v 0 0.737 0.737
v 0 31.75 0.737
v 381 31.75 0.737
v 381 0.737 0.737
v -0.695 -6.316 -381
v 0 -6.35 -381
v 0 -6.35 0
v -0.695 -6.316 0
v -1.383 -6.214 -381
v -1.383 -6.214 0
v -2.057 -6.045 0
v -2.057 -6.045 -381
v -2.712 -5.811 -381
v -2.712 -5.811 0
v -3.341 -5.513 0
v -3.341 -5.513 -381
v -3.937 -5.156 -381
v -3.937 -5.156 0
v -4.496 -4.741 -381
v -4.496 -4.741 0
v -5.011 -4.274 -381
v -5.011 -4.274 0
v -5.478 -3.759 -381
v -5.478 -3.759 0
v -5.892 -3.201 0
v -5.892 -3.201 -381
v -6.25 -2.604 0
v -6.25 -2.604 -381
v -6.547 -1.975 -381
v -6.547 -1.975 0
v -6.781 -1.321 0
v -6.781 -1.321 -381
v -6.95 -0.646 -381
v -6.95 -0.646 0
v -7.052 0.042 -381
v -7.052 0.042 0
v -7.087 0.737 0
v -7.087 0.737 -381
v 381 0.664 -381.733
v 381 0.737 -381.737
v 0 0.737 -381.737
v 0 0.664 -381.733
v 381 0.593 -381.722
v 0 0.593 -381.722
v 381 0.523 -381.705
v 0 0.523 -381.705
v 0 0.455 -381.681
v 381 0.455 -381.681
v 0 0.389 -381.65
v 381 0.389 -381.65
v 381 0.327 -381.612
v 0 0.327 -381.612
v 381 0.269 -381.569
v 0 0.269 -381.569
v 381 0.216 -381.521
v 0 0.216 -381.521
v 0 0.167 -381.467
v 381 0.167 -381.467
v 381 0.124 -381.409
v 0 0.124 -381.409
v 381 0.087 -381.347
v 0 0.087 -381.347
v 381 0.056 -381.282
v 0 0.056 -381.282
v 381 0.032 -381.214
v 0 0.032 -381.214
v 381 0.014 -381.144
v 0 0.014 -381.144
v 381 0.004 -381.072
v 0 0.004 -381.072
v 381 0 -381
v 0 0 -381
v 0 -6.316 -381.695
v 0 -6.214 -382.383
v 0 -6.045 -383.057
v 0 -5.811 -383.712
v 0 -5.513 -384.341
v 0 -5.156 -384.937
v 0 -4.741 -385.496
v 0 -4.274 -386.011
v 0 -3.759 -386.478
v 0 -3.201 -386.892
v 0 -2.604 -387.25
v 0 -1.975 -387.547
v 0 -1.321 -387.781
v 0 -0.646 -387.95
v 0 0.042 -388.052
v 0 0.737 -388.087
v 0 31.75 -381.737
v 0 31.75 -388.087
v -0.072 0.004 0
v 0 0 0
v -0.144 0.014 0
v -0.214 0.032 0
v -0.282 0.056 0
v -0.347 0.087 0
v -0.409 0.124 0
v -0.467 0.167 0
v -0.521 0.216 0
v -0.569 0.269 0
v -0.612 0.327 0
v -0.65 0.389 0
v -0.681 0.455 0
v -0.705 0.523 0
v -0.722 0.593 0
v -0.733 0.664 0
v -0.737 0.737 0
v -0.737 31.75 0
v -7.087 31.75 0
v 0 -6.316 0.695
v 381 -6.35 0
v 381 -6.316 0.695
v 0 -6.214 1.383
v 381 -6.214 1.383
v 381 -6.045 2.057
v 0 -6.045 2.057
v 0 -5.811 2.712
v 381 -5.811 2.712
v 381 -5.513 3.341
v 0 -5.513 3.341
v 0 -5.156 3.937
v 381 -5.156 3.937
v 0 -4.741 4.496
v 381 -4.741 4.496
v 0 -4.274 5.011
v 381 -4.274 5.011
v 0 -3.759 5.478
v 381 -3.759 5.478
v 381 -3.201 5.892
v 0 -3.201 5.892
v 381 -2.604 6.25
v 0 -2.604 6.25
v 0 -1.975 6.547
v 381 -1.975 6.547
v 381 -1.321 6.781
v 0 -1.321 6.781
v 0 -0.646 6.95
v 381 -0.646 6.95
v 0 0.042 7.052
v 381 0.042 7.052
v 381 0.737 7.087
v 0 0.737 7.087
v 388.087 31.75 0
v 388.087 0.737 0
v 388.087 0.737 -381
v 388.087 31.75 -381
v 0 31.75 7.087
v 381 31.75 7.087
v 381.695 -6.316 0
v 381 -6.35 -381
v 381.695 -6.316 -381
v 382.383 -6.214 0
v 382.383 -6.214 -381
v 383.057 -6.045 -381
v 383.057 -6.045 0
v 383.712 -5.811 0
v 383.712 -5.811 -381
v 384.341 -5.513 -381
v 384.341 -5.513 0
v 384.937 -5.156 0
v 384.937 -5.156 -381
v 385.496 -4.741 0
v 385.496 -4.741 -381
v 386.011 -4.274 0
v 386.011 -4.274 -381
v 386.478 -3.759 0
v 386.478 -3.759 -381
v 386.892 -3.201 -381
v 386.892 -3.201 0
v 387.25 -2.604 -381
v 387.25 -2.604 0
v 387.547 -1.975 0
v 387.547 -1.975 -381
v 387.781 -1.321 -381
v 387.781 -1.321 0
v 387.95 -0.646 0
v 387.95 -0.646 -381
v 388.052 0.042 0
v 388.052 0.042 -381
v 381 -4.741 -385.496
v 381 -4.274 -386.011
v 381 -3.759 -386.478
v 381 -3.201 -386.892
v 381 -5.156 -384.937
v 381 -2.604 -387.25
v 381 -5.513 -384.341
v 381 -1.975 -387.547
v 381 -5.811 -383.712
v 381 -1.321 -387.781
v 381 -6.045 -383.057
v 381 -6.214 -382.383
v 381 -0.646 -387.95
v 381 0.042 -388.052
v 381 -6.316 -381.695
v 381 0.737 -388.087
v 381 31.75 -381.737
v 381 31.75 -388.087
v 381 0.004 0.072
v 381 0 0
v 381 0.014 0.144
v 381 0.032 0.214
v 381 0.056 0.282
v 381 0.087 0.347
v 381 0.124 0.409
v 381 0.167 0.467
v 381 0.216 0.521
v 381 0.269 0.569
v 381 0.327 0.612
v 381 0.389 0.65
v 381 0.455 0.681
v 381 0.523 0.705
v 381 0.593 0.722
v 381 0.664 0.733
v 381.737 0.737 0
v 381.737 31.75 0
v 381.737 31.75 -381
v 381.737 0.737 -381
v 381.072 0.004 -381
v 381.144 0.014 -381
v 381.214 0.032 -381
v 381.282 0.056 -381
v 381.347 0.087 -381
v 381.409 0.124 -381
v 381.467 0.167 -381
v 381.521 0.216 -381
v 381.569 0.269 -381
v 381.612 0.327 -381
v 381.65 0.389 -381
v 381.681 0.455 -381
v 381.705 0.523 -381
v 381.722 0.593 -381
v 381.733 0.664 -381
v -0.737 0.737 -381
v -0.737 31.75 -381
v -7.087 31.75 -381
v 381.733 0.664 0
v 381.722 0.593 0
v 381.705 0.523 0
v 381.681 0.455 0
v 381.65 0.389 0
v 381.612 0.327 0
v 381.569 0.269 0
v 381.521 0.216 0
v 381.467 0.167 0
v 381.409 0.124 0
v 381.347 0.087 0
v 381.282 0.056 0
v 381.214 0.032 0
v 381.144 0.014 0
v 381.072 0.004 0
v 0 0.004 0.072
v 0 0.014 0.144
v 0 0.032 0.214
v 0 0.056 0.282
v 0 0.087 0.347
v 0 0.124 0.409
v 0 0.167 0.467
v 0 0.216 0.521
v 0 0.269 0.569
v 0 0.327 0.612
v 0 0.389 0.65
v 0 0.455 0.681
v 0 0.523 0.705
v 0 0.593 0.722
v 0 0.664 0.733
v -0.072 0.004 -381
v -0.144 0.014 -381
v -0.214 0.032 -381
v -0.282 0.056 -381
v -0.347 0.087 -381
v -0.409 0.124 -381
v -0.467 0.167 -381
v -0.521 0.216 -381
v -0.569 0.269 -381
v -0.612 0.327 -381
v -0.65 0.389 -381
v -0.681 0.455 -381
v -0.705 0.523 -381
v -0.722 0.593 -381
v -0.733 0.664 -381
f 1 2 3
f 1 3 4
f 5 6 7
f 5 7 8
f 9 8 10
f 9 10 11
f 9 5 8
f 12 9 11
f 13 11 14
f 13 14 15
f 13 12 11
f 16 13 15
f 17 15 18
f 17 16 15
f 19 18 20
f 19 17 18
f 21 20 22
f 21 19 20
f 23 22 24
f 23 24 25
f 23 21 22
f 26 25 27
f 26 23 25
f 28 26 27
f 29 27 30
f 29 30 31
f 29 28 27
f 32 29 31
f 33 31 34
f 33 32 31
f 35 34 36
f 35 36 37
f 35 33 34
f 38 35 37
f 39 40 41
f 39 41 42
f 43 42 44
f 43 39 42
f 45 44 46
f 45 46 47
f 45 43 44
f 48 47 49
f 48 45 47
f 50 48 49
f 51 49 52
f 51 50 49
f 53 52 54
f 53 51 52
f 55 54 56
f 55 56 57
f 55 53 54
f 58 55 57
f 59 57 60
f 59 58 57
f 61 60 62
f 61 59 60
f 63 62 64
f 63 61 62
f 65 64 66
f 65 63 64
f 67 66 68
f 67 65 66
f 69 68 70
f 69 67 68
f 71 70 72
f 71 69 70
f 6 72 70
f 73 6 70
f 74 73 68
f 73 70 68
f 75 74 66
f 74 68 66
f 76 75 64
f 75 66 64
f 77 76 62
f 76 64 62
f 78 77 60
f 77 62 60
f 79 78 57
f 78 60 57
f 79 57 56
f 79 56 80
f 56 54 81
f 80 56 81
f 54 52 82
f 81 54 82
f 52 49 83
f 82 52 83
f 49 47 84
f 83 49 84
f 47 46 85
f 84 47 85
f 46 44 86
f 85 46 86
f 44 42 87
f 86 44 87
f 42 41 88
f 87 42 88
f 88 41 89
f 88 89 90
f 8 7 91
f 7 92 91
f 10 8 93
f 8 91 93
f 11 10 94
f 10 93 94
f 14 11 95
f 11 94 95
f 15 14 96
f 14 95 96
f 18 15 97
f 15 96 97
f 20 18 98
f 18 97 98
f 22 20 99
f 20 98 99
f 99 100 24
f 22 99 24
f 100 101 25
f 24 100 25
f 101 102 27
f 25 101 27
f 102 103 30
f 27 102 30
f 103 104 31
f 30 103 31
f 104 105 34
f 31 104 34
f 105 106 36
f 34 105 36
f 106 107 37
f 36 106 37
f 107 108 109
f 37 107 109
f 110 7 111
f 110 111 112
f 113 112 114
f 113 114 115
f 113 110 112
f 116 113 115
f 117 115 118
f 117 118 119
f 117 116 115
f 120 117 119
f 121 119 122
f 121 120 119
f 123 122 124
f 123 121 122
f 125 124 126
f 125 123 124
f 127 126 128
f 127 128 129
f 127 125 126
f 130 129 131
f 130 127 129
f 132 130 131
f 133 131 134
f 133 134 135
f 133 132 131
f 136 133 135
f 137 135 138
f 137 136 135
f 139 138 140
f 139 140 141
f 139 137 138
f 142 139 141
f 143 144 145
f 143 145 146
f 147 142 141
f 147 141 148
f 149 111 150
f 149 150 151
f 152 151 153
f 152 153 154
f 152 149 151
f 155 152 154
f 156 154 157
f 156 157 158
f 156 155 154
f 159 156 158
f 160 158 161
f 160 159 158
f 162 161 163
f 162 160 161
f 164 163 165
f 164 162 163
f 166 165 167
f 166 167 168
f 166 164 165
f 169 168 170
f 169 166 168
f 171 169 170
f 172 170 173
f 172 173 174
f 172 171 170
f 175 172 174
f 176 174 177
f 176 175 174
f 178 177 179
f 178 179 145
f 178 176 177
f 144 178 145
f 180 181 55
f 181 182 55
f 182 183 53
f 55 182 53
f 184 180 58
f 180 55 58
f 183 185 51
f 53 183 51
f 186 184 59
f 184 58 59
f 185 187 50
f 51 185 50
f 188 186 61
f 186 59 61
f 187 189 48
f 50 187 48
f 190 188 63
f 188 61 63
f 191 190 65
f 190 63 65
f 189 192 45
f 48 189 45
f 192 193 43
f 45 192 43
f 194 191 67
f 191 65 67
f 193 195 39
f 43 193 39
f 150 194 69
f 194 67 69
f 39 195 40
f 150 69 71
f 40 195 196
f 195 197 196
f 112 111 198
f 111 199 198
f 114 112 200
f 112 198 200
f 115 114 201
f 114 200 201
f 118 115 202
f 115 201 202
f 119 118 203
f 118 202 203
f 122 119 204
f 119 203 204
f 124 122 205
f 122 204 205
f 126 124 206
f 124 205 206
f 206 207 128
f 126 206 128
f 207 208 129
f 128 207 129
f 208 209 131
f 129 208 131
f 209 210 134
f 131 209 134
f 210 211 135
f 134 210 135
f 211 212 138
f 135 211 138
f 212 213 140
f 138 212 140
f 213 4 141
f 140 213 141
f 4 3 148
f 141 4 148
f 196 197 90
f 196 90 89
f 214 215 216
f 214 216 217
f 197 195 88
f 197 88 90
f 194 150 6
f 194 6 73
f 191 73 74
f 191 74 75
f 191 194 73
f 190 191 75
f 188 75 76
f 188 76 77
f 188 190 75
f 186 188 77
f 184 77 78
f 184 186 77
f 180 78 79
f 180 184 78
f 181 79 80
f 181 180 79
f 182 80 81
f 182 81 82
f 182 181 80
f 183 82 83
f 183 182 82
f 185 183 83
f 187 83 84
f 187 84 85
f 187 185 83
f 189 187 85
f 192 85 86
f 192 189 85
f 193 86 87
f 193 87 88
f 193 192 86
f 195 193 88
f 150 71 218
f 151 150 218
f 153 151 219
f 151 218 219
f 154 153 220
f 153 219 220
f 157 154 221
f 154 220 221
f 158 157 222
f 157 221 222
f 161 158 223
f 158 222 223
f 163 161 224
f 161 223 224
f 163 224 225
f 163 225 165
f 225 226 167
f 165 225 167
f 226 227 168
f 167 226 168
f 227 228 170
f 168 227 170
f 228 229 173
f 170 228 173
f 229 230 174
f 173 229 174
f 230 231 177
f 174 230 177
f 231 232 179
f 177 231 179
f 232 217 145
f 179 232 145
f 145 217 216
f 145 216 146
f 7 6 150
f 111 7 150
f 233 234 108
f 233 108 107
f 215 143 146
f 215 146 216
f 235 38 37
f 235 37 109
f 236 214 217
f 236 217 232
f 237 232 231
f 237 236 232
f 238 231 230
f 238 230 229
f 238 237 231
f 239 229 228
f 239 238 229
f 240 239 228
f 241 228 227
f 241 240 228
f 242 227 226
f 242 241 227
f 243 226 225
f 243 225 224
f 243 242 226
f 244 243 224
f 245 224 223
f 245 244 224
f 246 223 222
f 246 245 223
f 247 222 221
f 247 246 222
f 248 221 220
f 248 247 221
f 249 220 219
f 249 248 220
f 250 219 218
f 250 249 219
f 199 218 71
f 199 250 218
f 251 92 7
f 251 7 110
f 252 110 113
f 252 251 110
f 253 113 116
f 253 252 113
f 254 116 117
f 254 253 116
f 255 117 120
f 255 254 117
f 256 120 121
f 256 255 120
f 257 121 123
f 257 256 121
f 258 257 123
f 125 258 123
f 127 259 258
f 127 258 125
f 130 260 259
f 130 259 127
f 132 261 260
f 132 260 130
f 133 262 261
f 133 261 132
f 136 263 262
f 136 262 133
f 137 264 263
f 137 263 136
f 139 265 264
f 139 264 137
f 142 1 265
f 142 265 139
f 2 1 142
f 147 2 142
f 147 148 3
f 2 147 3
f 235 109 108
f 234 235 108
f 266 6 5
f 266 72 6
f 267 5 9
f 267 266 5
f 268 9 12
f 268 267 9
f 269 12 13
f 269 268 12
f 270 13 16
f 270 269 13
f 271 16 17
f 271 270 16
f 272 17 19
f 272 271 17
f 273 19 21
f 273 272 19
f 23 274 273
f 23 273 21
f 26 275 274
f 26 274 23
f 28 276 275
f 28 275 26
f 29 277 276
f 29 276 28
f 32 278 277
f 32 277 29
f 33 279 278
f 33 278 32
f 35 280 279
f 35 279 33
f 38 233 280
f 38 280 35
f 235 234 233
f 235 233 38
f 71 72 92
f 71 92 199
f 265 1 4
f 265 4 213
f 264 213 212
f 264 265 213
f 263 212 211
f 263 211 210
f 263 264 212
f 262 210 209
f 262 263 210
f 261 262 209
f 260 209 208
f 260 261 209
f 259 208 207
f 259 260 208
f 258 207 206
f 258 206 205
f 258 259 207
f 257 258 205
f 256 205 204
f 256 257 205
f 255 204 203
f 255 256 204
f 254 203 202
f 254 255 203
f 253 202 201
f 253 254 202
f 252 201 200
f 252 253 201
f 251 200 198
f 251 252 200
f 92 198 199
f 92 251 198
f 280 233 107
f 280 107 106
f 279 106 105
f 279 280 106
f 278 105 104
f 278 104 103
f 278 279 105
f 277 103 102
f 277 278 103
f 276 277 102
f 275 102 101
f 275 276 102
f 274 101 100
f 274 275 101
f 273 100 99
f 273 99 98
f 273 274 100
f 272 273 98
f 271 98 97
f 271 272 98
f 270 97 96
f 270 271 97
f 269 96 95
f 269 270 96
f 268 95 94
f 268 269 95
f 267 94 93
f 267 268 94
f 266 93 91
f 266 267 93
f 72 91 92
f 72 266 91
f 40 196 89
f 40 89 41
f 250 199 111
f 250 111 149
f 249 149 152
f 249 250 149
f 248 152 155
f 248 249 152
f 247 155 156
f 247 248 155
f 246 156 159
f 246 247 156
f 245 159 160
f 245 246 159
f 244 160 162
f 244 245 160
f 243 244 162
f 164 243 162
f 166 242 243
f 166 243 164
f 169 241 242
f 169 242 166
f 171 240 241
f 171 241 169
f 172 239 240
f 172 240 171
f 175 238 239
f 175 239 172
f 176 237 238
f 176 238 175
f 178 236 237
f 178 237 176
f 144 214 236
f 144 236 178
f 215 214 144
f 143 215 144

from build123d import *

# Parameters (mm, degrees)
SKETCH1_W          = 381
SKETCH1_H          = 381
BASE_FLANGE1_DEPTH = 6.35
EDGE_FLANGE3_DEPTH = 381
EDGE_FLANGE4_DEPTH = 381
EDGE_FLANGE5_DEPTH = 381
EDGE_FLANGE6_DEPTH = 381


# Sheet-metal steps are written as plain solids
with BuildPart() as part:
    # Sketch1 → Base-Flange1 (new body)
    with BuildSketch(Plane(origin=(0, 0, 0), x_dir=(1, 0, 0), z_dir=(0, 1, 0))):
        with Locations((190.5, 190.5)):
            Rectangle(SKETCH1_W, SKETCH1_H)
    extrude(amount=-BASE_FLANGE1_DEPTH)

    # Edge-Flange3 section (across the edge) → Edge-Flange3 (add)
    with BuildSketch(Plane(origin=(-0.7366, 0, -381), x_dir=(1, 0, 0), z_dir=(0, 0, 1))):
        with BuildLine():
            Line((-6.35, 0.7366), (-6.35, 31.75))
            Line((-6.35, 31.75), (0, 31.75))
            Line((0, 31.75), (0, 0.7366))
            ThreePointArc((0, 0.7366), (0.215745145, 0.215745145), (0.7366, 0))
            Line((0.7366, 0), (0.7366, -6.35))
            ThreePointArc((0.7366, -6.35), (-4.274382916, -4.274382916), (-6.35, 0.7366))
        make_face()
    extrude(amount=EDGE_FLANGE3_DEPTH)

    # Edge-Flange4 section (across the edge) → Edge-Flange4 (add)
    with BuildSketch(Plane(origin=(381, 0, -381.7366), x_dir=(0, 0, 1), z_dir=(-1, 0, 0))):
        with BuildLine():
            Line((-6.35, 0.7366), (-6.35, 31.75))
            Line((-6.35, 31.75), (0, 31.75))
            Line((0, 31.75), (0, 0.7366))
            ThreePointArc((0, 0.7366), (0.215745145, 0.215745145), (0.7366, 0))
            Line((0.7366, 0), (0.7366, -6.35))
            ThreePointArc((0.7366, -6.35), (-4.274382916, -4.274382916), (-6.35, 0.7366))
        make_face()
    extrude(amount=EDGE_FLANGE4_DEPTH)

    # Edge-Flange5 section (across the edge) → Edge-Flange5 (add)
    with BuildSketch(Plane(origin=(0, 0, 0.7366), x_dir=(0, 0, -1), z_dir=(1, 0, 0))):
        with BuildLine():
            Line((-6.35, 0.7366), (-6.35, 31.75))
            Line((-6.35, 31.75), (0, 31.75))
            Line((0, 31.75), (0, 0.7366))
            ThreePointArc((0, 0.7366), (0.215745145, 0.215745145), (0.7366, 0))
            Line((0.7366, 0), (0.7366, -6.35))
            ThreePointArc((0.7366, -6.35), (-4.274382916, -4.274382916), (-6.35, 0.7366))
        make_face()
    extrude(amount=EDGE_FLANGE5_DEPTH)

    # Edge-Flange6 section (across the edge) → Edge-Flange6 (add)
    with BuildSketch(Plane(origin=(381.7366, 0, 0), x_dir=(-1, 0, 0), z_dir=(0, 0, -1))):
        with BuildLine():
            Line((-6.35, 0.7366), (-6.35, 31.75))
            Line((-6.35, 31.75), (0, 31.75))
            Line((0, 31.75), (0, 0.7366))
            ThreePointArc((0, 0.7366), (0.215745145, 0.215745145), (0.7366, 0))
            Line((0.7366, 0), (0.7366, -6.35))
            ThreePointArc((0.7366, -6.35), (-4.274382916, -4.274382916), (-6.35, 0.7366))
        make_face()
    extrude(amount=EDGE_FLANGE6_DEPTH)


solid = part.part
